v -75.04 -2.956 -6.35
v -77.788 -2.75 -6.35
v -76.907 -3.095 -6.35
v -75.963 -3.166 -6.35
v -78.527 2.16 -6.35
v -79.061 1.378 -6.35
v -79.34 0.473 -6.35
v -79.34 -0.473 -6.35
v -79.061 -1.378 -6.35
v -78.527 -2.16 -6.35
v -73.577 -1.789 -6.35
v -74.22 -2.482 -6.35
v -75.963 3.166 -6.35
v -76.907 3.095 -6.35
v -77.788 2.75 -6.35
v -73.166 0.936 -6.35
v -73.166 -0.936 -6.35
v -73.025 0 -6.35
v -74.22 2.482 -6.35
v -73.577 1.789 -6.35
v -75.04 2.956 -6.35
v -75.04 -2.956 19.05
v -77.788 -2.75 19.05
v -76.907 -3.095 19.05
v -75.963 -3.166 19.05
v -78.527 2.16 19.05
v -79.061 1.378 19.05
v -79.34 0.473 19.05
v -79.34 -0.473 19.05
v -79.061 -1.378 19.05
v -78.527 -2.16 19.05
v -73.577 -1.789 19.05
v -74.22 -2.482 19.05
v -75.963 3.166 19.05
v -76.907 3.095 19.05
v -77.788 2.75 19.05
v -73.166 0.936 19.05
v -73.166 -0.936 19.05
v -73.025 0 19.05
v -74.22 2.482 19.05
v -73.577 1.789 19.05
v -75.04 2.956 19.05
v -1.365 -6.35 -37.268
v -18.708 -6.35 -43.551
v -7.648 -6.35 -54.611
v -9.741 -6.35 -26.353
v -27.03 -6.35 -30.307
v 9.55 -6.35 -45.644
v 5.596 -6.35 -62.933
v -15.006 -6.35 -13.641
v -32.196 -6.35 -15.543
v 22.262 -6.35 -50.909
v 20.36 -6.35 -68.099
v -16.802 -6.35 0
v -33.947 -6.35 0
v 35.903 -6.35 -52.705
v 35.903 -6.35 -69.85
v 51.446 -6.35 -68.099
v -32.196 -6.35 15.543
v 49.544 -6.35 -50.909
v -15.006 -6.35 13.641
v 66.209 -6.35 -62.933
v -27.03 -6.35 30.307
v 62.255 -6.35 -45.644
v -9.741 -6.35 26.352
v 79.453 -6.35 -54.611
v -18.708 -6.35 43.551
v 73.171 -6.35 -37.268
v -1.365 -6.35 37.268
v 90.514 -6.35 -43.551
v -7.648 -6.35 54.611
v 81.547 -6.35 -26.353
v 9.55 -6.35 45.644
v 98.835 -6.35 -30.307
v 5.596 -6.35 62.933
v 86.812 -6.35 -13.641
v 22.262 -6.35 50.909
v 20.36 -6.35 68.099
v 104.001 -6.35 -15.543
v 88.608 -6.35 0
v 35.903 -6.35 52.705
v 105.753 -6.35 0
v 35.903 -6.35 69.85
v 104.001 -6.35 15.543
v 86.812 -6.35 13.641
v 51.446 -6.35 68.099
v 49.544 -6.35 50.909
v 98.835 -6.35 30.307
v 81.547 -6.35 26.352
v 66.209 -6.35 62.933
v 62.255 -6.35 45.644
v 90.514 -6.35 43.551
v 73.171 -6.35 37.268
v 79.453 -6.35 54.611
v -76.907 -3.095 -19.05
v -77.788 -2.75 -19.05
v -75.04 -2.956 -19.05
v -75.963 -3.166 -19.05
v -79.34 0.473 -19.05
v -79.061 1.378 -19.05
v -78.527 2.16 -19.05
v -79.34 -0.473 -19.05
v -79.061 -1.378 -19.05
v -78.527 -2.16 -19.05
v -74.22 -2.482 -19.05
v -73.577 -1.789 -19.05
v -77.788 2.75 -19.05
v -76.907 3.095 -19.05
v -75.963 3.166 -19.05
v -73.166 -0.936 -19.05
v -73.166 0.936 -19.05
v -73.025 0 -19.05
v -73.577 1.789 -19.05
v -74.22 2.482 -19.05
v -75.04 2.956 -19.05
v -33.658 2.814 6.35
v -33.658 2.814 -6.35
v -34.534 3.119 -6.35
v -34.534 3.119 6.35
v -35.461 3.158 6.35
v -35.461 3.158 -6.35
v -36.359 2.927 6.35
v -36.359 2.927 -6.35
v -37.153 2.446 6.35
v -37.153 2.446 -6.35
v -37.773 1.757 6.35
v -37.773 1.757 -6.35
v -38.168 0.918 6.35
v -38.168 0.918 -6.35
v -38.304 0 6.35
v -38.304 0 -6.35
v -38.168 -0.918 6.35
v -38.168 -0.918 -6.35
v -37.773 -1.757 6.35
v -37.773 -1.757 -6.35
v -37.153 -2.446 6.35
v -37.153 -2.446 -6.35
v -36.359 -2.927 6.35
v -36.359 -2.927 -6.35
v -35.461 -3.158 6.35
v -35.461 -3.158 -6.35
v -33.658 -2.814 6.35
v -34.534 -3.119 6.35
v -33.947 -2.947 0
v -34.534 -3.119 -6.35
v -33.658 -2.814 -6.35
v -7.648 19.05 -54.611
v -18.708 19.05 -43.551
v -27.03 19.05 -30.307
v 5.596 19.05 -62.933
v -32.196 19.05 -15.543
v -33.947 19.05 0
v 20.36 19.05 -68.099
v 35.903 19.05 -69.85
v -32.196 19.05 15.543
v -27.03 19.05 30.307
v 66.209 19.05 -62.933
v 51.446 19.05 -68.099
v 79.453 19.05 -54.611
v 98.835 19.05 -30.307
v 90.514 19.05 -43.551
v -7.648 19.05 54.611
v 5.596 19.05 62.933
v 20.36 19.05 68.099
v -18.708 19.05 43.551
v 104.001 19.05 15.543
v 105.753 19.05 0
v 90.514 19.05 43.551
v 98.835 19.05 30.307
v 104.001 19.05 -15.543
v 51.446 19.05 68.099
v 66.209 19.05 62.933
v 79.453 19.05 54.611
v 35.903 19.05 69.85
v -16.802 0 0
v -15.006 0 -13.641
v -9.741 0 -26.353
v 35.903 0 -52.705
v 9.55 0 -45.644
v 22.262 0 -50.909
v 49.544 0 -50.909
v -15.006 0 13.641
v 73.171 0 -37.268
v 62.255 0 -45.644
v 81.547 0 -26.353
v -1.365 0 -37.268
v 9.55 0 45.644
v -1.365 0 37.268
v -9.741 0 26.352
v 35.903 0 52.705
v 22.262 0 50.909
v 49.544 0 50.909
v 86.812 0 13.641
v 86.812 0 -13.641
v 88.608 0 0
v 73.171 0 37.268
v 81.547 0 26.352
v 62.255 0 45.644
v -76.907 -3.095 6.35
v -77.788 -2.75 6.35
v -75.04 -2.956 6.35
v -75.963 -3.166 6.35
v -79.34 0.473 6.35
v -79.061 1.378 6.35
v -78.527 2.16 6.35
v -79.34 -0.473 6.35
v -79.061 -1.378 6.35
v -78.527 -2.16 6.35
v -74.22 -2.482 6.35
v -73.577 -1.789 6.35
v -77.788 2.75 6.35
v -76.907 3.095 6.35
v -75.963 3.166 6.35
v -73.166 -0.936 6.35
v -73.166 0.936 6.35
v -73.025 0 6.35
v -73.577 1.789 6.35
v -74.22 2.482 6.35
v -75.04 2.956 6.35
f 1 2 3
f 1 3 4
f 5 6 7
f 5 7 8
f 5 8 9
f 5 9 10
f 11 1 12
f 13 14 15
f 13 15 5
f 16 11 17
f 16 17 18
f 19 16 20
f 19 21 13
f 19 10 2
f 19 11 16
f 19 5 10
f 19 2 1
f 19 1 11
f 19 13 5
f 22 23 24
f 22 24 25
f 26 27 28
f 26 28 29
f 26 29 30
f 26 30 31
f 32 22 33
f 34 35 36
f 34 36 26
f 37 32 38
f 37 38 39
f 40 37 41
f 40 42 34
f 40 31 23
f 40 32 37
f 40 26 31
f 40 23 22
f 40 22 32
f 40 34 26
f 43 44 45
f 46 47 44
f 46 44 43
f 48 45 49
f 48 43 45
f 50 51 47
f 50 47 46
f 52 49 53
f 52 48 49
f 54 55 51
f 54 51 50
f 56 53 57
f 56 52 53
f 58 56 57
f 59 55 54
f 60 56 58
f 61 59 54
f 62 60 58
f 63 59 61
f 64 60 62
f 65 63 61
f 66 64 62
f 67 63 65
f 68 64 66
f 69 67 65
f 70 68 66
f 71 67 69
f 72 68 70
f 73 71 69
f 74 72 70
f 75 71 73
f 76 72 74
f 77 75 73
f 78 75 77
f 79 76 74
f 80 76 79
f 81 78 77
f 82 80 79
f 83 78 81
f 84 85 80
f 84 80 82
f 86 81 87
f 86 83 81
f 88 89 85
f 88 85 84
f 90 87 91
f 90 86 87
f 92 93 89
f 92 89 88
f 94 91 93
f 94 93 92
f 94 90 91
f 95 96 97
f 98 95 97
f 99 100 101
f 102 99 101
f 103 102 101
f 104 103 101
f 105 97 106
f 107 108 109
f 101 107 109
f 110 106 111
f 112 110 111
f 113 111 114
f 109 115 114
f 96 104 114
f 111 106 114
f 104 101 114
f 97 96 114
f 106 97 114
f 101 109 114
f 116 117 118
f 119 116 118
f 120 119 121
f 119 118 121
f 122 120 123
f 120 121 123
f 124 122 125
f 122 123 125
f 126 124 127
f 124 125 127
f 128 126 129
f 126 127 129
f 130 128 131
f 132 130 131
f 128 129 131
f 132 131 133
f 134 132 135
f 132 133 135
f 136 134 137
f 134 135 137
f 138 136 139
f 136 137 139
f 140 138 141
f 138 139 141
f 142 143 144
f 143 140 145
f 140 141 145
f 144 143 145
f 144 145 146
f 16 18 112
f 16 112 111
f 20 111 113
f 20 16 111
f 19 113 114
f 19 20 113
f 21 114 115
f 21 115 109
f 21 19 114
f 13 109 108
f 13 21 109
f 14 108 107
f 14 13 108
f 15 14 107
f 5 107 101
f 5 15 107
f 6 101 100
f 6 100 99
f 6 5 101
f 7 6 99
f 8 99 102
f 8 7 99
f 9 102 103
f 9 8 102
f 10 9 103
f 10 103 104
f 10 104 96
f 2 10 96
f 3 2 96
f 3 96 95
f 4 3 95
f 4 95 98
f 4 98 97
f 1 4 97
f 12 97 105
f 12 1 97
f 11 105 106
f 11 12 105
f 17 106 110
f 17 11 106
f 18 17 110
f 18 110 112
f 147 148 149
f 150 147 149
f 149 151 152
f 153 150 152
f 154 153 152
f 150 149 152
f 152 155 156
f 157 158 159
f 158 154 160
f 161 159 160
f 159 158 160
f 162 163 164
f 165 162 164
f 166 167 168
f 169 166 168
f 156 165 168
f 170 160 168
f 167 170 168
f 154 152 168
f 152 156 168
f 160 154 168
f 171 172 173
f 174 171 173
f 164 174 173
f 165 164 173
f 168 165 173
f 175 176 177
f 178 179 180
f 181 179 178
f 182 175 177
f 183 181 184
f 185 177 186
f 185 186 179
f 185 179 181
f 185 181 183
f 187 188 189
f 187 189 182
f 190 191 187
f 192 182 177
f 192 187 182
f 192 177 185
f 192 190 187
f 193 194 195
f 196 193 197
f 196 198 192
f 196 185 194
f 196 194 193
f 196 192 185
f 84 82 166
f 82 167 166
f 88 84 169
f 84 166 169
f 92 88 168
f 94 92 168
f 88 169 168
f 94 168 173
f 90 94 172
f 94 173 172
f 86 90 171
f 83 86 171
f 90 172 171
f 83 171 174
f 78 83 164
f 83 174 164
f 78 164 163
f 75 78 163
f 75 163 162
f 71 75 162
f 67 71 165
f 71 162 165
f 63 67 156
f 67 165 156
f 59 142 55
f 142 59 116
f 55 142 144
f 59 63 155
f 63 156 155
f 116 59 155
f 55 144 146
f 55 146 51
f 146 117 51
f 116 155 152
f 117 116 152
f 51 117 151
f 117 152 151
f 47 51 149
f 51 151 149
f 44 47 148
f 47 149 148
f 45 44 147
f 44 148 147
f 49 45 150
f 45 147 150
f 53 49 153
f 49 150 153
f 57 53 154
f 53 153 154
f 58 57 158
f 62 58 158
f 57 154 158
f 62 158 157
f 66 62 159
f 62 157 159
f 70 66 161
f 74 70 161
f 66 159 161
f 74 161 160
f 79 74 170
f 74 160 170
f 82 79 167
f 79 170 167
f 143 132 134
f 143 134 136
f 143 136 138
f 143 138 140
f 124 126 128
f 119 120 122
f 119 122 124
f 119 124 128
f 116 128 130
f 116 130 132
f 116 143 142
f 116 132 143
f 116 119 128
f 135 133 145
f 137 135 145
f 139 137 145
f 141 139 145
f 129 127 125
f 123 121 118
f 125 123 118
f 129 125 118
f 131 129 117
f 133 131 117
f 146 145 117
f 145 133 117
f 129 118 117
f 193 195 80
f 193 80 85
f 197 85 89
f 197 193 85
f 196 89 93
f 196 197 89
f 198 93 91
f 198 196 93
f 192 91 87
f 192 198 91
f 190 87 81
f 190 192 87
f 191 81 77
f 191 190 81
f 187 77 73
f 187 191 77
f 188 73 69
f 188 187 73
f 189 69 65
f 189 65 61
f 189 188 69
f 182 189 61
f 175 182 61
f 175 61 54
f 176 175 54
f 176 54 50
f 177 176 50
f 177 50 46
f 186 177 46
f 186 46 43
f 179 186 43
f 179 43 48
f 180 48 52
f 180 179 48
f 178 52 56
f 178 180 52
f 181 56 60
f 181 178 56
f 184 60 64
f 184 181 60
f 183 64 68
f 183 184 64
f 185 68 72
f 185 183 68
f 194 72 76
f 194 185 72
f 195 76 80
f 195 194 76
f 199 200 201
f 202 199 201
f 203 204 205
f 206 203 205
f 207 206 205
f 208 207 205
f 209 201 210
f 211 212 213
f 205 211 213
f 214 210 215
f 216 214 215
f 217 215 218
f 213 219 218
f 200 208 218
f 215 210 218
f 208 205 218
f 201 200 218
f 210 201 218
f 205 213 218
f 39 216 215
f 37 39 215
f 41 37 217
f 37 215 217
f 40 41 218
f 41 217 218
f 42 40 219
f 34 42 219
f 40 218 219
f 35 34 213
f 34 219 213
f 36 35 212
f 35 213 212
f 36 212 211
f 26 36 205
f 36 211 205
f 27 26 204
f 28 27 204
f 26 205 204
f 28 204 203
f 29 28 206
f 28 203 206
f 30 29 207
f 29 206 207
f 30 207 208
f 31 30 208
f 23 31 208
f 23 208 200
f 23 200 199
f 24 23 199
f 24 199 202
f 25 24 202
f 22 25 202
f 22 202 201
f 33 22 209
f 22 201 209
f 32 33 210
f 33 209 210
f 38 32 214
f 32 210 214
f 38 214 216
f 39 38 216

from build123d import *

# Parameters (mm, degrees)
F1_START      = 6.35
F0_R          = 3.175
F1_DEPTH      = 12.7
F3_START      = -6.35
F2_R          = 3.175
F3_DEPTH      = 12.7
F4_R          = 3.175
F5_DEPTH      = 6.35
F5_DEPTH_BACK = 6.35
F6_R          = 69.85
F7_DEPTH      = 19.05
F8_R          = 69.85
F8_R_2        = 52.705
F9_DEPTH      = 6.35


with BuildPart() as f1:
    # F0 (on Top) → F1 (new body)
    with BuildSketch(Plane.XY.offset(F1_START)):
        with Locations((-76.2, 0)):
            Circle(F0_R)
    extrude(amount=F1_DEPTH)


with BuildPart() as f3:
    # F2 (on Top) → F3 (new body)
    with BuildSketch(Plane.XY.offset(F3_START)):
        with Locations((-76.2, 0)):
            Circle(F2_R)
    extrude(amount=-F3_DEPTH)


with BuildPart() as f5:
    # F4 (on Top) → F5 (new body, two sides)
    with BuildSketch(Plane.XY) as f5_sk:
        with Locations((-35.1287453057, 0)):
            Circle(F4_R)
    extrude(amount=-F5_DEPTH)
    extrude(f5_sk.sketch, amount=F5_DEPTH_BACK)

    # F6 (on Front) → F7 (join)
    with BuildSketch(Plane.XZ):
        with Locations((35.9026640654, 0)):
            Circle(F6_R)
    extrude(amount=-F7_DEPTH)

    # F8 (on face) → F9 (join)
    with BuildSketch(Plane.XZ):
        with Locations((35.9026640654, 0)):
            Circle(F8_R)
        with Locations((35.9026640654, 0)):
            Circle(F8_R_2, mode=Mode.SUBTRACT)
    extrude(amount=F9_DEPTH)


solid = Compound([f1.part, f3.part, f5.part])
